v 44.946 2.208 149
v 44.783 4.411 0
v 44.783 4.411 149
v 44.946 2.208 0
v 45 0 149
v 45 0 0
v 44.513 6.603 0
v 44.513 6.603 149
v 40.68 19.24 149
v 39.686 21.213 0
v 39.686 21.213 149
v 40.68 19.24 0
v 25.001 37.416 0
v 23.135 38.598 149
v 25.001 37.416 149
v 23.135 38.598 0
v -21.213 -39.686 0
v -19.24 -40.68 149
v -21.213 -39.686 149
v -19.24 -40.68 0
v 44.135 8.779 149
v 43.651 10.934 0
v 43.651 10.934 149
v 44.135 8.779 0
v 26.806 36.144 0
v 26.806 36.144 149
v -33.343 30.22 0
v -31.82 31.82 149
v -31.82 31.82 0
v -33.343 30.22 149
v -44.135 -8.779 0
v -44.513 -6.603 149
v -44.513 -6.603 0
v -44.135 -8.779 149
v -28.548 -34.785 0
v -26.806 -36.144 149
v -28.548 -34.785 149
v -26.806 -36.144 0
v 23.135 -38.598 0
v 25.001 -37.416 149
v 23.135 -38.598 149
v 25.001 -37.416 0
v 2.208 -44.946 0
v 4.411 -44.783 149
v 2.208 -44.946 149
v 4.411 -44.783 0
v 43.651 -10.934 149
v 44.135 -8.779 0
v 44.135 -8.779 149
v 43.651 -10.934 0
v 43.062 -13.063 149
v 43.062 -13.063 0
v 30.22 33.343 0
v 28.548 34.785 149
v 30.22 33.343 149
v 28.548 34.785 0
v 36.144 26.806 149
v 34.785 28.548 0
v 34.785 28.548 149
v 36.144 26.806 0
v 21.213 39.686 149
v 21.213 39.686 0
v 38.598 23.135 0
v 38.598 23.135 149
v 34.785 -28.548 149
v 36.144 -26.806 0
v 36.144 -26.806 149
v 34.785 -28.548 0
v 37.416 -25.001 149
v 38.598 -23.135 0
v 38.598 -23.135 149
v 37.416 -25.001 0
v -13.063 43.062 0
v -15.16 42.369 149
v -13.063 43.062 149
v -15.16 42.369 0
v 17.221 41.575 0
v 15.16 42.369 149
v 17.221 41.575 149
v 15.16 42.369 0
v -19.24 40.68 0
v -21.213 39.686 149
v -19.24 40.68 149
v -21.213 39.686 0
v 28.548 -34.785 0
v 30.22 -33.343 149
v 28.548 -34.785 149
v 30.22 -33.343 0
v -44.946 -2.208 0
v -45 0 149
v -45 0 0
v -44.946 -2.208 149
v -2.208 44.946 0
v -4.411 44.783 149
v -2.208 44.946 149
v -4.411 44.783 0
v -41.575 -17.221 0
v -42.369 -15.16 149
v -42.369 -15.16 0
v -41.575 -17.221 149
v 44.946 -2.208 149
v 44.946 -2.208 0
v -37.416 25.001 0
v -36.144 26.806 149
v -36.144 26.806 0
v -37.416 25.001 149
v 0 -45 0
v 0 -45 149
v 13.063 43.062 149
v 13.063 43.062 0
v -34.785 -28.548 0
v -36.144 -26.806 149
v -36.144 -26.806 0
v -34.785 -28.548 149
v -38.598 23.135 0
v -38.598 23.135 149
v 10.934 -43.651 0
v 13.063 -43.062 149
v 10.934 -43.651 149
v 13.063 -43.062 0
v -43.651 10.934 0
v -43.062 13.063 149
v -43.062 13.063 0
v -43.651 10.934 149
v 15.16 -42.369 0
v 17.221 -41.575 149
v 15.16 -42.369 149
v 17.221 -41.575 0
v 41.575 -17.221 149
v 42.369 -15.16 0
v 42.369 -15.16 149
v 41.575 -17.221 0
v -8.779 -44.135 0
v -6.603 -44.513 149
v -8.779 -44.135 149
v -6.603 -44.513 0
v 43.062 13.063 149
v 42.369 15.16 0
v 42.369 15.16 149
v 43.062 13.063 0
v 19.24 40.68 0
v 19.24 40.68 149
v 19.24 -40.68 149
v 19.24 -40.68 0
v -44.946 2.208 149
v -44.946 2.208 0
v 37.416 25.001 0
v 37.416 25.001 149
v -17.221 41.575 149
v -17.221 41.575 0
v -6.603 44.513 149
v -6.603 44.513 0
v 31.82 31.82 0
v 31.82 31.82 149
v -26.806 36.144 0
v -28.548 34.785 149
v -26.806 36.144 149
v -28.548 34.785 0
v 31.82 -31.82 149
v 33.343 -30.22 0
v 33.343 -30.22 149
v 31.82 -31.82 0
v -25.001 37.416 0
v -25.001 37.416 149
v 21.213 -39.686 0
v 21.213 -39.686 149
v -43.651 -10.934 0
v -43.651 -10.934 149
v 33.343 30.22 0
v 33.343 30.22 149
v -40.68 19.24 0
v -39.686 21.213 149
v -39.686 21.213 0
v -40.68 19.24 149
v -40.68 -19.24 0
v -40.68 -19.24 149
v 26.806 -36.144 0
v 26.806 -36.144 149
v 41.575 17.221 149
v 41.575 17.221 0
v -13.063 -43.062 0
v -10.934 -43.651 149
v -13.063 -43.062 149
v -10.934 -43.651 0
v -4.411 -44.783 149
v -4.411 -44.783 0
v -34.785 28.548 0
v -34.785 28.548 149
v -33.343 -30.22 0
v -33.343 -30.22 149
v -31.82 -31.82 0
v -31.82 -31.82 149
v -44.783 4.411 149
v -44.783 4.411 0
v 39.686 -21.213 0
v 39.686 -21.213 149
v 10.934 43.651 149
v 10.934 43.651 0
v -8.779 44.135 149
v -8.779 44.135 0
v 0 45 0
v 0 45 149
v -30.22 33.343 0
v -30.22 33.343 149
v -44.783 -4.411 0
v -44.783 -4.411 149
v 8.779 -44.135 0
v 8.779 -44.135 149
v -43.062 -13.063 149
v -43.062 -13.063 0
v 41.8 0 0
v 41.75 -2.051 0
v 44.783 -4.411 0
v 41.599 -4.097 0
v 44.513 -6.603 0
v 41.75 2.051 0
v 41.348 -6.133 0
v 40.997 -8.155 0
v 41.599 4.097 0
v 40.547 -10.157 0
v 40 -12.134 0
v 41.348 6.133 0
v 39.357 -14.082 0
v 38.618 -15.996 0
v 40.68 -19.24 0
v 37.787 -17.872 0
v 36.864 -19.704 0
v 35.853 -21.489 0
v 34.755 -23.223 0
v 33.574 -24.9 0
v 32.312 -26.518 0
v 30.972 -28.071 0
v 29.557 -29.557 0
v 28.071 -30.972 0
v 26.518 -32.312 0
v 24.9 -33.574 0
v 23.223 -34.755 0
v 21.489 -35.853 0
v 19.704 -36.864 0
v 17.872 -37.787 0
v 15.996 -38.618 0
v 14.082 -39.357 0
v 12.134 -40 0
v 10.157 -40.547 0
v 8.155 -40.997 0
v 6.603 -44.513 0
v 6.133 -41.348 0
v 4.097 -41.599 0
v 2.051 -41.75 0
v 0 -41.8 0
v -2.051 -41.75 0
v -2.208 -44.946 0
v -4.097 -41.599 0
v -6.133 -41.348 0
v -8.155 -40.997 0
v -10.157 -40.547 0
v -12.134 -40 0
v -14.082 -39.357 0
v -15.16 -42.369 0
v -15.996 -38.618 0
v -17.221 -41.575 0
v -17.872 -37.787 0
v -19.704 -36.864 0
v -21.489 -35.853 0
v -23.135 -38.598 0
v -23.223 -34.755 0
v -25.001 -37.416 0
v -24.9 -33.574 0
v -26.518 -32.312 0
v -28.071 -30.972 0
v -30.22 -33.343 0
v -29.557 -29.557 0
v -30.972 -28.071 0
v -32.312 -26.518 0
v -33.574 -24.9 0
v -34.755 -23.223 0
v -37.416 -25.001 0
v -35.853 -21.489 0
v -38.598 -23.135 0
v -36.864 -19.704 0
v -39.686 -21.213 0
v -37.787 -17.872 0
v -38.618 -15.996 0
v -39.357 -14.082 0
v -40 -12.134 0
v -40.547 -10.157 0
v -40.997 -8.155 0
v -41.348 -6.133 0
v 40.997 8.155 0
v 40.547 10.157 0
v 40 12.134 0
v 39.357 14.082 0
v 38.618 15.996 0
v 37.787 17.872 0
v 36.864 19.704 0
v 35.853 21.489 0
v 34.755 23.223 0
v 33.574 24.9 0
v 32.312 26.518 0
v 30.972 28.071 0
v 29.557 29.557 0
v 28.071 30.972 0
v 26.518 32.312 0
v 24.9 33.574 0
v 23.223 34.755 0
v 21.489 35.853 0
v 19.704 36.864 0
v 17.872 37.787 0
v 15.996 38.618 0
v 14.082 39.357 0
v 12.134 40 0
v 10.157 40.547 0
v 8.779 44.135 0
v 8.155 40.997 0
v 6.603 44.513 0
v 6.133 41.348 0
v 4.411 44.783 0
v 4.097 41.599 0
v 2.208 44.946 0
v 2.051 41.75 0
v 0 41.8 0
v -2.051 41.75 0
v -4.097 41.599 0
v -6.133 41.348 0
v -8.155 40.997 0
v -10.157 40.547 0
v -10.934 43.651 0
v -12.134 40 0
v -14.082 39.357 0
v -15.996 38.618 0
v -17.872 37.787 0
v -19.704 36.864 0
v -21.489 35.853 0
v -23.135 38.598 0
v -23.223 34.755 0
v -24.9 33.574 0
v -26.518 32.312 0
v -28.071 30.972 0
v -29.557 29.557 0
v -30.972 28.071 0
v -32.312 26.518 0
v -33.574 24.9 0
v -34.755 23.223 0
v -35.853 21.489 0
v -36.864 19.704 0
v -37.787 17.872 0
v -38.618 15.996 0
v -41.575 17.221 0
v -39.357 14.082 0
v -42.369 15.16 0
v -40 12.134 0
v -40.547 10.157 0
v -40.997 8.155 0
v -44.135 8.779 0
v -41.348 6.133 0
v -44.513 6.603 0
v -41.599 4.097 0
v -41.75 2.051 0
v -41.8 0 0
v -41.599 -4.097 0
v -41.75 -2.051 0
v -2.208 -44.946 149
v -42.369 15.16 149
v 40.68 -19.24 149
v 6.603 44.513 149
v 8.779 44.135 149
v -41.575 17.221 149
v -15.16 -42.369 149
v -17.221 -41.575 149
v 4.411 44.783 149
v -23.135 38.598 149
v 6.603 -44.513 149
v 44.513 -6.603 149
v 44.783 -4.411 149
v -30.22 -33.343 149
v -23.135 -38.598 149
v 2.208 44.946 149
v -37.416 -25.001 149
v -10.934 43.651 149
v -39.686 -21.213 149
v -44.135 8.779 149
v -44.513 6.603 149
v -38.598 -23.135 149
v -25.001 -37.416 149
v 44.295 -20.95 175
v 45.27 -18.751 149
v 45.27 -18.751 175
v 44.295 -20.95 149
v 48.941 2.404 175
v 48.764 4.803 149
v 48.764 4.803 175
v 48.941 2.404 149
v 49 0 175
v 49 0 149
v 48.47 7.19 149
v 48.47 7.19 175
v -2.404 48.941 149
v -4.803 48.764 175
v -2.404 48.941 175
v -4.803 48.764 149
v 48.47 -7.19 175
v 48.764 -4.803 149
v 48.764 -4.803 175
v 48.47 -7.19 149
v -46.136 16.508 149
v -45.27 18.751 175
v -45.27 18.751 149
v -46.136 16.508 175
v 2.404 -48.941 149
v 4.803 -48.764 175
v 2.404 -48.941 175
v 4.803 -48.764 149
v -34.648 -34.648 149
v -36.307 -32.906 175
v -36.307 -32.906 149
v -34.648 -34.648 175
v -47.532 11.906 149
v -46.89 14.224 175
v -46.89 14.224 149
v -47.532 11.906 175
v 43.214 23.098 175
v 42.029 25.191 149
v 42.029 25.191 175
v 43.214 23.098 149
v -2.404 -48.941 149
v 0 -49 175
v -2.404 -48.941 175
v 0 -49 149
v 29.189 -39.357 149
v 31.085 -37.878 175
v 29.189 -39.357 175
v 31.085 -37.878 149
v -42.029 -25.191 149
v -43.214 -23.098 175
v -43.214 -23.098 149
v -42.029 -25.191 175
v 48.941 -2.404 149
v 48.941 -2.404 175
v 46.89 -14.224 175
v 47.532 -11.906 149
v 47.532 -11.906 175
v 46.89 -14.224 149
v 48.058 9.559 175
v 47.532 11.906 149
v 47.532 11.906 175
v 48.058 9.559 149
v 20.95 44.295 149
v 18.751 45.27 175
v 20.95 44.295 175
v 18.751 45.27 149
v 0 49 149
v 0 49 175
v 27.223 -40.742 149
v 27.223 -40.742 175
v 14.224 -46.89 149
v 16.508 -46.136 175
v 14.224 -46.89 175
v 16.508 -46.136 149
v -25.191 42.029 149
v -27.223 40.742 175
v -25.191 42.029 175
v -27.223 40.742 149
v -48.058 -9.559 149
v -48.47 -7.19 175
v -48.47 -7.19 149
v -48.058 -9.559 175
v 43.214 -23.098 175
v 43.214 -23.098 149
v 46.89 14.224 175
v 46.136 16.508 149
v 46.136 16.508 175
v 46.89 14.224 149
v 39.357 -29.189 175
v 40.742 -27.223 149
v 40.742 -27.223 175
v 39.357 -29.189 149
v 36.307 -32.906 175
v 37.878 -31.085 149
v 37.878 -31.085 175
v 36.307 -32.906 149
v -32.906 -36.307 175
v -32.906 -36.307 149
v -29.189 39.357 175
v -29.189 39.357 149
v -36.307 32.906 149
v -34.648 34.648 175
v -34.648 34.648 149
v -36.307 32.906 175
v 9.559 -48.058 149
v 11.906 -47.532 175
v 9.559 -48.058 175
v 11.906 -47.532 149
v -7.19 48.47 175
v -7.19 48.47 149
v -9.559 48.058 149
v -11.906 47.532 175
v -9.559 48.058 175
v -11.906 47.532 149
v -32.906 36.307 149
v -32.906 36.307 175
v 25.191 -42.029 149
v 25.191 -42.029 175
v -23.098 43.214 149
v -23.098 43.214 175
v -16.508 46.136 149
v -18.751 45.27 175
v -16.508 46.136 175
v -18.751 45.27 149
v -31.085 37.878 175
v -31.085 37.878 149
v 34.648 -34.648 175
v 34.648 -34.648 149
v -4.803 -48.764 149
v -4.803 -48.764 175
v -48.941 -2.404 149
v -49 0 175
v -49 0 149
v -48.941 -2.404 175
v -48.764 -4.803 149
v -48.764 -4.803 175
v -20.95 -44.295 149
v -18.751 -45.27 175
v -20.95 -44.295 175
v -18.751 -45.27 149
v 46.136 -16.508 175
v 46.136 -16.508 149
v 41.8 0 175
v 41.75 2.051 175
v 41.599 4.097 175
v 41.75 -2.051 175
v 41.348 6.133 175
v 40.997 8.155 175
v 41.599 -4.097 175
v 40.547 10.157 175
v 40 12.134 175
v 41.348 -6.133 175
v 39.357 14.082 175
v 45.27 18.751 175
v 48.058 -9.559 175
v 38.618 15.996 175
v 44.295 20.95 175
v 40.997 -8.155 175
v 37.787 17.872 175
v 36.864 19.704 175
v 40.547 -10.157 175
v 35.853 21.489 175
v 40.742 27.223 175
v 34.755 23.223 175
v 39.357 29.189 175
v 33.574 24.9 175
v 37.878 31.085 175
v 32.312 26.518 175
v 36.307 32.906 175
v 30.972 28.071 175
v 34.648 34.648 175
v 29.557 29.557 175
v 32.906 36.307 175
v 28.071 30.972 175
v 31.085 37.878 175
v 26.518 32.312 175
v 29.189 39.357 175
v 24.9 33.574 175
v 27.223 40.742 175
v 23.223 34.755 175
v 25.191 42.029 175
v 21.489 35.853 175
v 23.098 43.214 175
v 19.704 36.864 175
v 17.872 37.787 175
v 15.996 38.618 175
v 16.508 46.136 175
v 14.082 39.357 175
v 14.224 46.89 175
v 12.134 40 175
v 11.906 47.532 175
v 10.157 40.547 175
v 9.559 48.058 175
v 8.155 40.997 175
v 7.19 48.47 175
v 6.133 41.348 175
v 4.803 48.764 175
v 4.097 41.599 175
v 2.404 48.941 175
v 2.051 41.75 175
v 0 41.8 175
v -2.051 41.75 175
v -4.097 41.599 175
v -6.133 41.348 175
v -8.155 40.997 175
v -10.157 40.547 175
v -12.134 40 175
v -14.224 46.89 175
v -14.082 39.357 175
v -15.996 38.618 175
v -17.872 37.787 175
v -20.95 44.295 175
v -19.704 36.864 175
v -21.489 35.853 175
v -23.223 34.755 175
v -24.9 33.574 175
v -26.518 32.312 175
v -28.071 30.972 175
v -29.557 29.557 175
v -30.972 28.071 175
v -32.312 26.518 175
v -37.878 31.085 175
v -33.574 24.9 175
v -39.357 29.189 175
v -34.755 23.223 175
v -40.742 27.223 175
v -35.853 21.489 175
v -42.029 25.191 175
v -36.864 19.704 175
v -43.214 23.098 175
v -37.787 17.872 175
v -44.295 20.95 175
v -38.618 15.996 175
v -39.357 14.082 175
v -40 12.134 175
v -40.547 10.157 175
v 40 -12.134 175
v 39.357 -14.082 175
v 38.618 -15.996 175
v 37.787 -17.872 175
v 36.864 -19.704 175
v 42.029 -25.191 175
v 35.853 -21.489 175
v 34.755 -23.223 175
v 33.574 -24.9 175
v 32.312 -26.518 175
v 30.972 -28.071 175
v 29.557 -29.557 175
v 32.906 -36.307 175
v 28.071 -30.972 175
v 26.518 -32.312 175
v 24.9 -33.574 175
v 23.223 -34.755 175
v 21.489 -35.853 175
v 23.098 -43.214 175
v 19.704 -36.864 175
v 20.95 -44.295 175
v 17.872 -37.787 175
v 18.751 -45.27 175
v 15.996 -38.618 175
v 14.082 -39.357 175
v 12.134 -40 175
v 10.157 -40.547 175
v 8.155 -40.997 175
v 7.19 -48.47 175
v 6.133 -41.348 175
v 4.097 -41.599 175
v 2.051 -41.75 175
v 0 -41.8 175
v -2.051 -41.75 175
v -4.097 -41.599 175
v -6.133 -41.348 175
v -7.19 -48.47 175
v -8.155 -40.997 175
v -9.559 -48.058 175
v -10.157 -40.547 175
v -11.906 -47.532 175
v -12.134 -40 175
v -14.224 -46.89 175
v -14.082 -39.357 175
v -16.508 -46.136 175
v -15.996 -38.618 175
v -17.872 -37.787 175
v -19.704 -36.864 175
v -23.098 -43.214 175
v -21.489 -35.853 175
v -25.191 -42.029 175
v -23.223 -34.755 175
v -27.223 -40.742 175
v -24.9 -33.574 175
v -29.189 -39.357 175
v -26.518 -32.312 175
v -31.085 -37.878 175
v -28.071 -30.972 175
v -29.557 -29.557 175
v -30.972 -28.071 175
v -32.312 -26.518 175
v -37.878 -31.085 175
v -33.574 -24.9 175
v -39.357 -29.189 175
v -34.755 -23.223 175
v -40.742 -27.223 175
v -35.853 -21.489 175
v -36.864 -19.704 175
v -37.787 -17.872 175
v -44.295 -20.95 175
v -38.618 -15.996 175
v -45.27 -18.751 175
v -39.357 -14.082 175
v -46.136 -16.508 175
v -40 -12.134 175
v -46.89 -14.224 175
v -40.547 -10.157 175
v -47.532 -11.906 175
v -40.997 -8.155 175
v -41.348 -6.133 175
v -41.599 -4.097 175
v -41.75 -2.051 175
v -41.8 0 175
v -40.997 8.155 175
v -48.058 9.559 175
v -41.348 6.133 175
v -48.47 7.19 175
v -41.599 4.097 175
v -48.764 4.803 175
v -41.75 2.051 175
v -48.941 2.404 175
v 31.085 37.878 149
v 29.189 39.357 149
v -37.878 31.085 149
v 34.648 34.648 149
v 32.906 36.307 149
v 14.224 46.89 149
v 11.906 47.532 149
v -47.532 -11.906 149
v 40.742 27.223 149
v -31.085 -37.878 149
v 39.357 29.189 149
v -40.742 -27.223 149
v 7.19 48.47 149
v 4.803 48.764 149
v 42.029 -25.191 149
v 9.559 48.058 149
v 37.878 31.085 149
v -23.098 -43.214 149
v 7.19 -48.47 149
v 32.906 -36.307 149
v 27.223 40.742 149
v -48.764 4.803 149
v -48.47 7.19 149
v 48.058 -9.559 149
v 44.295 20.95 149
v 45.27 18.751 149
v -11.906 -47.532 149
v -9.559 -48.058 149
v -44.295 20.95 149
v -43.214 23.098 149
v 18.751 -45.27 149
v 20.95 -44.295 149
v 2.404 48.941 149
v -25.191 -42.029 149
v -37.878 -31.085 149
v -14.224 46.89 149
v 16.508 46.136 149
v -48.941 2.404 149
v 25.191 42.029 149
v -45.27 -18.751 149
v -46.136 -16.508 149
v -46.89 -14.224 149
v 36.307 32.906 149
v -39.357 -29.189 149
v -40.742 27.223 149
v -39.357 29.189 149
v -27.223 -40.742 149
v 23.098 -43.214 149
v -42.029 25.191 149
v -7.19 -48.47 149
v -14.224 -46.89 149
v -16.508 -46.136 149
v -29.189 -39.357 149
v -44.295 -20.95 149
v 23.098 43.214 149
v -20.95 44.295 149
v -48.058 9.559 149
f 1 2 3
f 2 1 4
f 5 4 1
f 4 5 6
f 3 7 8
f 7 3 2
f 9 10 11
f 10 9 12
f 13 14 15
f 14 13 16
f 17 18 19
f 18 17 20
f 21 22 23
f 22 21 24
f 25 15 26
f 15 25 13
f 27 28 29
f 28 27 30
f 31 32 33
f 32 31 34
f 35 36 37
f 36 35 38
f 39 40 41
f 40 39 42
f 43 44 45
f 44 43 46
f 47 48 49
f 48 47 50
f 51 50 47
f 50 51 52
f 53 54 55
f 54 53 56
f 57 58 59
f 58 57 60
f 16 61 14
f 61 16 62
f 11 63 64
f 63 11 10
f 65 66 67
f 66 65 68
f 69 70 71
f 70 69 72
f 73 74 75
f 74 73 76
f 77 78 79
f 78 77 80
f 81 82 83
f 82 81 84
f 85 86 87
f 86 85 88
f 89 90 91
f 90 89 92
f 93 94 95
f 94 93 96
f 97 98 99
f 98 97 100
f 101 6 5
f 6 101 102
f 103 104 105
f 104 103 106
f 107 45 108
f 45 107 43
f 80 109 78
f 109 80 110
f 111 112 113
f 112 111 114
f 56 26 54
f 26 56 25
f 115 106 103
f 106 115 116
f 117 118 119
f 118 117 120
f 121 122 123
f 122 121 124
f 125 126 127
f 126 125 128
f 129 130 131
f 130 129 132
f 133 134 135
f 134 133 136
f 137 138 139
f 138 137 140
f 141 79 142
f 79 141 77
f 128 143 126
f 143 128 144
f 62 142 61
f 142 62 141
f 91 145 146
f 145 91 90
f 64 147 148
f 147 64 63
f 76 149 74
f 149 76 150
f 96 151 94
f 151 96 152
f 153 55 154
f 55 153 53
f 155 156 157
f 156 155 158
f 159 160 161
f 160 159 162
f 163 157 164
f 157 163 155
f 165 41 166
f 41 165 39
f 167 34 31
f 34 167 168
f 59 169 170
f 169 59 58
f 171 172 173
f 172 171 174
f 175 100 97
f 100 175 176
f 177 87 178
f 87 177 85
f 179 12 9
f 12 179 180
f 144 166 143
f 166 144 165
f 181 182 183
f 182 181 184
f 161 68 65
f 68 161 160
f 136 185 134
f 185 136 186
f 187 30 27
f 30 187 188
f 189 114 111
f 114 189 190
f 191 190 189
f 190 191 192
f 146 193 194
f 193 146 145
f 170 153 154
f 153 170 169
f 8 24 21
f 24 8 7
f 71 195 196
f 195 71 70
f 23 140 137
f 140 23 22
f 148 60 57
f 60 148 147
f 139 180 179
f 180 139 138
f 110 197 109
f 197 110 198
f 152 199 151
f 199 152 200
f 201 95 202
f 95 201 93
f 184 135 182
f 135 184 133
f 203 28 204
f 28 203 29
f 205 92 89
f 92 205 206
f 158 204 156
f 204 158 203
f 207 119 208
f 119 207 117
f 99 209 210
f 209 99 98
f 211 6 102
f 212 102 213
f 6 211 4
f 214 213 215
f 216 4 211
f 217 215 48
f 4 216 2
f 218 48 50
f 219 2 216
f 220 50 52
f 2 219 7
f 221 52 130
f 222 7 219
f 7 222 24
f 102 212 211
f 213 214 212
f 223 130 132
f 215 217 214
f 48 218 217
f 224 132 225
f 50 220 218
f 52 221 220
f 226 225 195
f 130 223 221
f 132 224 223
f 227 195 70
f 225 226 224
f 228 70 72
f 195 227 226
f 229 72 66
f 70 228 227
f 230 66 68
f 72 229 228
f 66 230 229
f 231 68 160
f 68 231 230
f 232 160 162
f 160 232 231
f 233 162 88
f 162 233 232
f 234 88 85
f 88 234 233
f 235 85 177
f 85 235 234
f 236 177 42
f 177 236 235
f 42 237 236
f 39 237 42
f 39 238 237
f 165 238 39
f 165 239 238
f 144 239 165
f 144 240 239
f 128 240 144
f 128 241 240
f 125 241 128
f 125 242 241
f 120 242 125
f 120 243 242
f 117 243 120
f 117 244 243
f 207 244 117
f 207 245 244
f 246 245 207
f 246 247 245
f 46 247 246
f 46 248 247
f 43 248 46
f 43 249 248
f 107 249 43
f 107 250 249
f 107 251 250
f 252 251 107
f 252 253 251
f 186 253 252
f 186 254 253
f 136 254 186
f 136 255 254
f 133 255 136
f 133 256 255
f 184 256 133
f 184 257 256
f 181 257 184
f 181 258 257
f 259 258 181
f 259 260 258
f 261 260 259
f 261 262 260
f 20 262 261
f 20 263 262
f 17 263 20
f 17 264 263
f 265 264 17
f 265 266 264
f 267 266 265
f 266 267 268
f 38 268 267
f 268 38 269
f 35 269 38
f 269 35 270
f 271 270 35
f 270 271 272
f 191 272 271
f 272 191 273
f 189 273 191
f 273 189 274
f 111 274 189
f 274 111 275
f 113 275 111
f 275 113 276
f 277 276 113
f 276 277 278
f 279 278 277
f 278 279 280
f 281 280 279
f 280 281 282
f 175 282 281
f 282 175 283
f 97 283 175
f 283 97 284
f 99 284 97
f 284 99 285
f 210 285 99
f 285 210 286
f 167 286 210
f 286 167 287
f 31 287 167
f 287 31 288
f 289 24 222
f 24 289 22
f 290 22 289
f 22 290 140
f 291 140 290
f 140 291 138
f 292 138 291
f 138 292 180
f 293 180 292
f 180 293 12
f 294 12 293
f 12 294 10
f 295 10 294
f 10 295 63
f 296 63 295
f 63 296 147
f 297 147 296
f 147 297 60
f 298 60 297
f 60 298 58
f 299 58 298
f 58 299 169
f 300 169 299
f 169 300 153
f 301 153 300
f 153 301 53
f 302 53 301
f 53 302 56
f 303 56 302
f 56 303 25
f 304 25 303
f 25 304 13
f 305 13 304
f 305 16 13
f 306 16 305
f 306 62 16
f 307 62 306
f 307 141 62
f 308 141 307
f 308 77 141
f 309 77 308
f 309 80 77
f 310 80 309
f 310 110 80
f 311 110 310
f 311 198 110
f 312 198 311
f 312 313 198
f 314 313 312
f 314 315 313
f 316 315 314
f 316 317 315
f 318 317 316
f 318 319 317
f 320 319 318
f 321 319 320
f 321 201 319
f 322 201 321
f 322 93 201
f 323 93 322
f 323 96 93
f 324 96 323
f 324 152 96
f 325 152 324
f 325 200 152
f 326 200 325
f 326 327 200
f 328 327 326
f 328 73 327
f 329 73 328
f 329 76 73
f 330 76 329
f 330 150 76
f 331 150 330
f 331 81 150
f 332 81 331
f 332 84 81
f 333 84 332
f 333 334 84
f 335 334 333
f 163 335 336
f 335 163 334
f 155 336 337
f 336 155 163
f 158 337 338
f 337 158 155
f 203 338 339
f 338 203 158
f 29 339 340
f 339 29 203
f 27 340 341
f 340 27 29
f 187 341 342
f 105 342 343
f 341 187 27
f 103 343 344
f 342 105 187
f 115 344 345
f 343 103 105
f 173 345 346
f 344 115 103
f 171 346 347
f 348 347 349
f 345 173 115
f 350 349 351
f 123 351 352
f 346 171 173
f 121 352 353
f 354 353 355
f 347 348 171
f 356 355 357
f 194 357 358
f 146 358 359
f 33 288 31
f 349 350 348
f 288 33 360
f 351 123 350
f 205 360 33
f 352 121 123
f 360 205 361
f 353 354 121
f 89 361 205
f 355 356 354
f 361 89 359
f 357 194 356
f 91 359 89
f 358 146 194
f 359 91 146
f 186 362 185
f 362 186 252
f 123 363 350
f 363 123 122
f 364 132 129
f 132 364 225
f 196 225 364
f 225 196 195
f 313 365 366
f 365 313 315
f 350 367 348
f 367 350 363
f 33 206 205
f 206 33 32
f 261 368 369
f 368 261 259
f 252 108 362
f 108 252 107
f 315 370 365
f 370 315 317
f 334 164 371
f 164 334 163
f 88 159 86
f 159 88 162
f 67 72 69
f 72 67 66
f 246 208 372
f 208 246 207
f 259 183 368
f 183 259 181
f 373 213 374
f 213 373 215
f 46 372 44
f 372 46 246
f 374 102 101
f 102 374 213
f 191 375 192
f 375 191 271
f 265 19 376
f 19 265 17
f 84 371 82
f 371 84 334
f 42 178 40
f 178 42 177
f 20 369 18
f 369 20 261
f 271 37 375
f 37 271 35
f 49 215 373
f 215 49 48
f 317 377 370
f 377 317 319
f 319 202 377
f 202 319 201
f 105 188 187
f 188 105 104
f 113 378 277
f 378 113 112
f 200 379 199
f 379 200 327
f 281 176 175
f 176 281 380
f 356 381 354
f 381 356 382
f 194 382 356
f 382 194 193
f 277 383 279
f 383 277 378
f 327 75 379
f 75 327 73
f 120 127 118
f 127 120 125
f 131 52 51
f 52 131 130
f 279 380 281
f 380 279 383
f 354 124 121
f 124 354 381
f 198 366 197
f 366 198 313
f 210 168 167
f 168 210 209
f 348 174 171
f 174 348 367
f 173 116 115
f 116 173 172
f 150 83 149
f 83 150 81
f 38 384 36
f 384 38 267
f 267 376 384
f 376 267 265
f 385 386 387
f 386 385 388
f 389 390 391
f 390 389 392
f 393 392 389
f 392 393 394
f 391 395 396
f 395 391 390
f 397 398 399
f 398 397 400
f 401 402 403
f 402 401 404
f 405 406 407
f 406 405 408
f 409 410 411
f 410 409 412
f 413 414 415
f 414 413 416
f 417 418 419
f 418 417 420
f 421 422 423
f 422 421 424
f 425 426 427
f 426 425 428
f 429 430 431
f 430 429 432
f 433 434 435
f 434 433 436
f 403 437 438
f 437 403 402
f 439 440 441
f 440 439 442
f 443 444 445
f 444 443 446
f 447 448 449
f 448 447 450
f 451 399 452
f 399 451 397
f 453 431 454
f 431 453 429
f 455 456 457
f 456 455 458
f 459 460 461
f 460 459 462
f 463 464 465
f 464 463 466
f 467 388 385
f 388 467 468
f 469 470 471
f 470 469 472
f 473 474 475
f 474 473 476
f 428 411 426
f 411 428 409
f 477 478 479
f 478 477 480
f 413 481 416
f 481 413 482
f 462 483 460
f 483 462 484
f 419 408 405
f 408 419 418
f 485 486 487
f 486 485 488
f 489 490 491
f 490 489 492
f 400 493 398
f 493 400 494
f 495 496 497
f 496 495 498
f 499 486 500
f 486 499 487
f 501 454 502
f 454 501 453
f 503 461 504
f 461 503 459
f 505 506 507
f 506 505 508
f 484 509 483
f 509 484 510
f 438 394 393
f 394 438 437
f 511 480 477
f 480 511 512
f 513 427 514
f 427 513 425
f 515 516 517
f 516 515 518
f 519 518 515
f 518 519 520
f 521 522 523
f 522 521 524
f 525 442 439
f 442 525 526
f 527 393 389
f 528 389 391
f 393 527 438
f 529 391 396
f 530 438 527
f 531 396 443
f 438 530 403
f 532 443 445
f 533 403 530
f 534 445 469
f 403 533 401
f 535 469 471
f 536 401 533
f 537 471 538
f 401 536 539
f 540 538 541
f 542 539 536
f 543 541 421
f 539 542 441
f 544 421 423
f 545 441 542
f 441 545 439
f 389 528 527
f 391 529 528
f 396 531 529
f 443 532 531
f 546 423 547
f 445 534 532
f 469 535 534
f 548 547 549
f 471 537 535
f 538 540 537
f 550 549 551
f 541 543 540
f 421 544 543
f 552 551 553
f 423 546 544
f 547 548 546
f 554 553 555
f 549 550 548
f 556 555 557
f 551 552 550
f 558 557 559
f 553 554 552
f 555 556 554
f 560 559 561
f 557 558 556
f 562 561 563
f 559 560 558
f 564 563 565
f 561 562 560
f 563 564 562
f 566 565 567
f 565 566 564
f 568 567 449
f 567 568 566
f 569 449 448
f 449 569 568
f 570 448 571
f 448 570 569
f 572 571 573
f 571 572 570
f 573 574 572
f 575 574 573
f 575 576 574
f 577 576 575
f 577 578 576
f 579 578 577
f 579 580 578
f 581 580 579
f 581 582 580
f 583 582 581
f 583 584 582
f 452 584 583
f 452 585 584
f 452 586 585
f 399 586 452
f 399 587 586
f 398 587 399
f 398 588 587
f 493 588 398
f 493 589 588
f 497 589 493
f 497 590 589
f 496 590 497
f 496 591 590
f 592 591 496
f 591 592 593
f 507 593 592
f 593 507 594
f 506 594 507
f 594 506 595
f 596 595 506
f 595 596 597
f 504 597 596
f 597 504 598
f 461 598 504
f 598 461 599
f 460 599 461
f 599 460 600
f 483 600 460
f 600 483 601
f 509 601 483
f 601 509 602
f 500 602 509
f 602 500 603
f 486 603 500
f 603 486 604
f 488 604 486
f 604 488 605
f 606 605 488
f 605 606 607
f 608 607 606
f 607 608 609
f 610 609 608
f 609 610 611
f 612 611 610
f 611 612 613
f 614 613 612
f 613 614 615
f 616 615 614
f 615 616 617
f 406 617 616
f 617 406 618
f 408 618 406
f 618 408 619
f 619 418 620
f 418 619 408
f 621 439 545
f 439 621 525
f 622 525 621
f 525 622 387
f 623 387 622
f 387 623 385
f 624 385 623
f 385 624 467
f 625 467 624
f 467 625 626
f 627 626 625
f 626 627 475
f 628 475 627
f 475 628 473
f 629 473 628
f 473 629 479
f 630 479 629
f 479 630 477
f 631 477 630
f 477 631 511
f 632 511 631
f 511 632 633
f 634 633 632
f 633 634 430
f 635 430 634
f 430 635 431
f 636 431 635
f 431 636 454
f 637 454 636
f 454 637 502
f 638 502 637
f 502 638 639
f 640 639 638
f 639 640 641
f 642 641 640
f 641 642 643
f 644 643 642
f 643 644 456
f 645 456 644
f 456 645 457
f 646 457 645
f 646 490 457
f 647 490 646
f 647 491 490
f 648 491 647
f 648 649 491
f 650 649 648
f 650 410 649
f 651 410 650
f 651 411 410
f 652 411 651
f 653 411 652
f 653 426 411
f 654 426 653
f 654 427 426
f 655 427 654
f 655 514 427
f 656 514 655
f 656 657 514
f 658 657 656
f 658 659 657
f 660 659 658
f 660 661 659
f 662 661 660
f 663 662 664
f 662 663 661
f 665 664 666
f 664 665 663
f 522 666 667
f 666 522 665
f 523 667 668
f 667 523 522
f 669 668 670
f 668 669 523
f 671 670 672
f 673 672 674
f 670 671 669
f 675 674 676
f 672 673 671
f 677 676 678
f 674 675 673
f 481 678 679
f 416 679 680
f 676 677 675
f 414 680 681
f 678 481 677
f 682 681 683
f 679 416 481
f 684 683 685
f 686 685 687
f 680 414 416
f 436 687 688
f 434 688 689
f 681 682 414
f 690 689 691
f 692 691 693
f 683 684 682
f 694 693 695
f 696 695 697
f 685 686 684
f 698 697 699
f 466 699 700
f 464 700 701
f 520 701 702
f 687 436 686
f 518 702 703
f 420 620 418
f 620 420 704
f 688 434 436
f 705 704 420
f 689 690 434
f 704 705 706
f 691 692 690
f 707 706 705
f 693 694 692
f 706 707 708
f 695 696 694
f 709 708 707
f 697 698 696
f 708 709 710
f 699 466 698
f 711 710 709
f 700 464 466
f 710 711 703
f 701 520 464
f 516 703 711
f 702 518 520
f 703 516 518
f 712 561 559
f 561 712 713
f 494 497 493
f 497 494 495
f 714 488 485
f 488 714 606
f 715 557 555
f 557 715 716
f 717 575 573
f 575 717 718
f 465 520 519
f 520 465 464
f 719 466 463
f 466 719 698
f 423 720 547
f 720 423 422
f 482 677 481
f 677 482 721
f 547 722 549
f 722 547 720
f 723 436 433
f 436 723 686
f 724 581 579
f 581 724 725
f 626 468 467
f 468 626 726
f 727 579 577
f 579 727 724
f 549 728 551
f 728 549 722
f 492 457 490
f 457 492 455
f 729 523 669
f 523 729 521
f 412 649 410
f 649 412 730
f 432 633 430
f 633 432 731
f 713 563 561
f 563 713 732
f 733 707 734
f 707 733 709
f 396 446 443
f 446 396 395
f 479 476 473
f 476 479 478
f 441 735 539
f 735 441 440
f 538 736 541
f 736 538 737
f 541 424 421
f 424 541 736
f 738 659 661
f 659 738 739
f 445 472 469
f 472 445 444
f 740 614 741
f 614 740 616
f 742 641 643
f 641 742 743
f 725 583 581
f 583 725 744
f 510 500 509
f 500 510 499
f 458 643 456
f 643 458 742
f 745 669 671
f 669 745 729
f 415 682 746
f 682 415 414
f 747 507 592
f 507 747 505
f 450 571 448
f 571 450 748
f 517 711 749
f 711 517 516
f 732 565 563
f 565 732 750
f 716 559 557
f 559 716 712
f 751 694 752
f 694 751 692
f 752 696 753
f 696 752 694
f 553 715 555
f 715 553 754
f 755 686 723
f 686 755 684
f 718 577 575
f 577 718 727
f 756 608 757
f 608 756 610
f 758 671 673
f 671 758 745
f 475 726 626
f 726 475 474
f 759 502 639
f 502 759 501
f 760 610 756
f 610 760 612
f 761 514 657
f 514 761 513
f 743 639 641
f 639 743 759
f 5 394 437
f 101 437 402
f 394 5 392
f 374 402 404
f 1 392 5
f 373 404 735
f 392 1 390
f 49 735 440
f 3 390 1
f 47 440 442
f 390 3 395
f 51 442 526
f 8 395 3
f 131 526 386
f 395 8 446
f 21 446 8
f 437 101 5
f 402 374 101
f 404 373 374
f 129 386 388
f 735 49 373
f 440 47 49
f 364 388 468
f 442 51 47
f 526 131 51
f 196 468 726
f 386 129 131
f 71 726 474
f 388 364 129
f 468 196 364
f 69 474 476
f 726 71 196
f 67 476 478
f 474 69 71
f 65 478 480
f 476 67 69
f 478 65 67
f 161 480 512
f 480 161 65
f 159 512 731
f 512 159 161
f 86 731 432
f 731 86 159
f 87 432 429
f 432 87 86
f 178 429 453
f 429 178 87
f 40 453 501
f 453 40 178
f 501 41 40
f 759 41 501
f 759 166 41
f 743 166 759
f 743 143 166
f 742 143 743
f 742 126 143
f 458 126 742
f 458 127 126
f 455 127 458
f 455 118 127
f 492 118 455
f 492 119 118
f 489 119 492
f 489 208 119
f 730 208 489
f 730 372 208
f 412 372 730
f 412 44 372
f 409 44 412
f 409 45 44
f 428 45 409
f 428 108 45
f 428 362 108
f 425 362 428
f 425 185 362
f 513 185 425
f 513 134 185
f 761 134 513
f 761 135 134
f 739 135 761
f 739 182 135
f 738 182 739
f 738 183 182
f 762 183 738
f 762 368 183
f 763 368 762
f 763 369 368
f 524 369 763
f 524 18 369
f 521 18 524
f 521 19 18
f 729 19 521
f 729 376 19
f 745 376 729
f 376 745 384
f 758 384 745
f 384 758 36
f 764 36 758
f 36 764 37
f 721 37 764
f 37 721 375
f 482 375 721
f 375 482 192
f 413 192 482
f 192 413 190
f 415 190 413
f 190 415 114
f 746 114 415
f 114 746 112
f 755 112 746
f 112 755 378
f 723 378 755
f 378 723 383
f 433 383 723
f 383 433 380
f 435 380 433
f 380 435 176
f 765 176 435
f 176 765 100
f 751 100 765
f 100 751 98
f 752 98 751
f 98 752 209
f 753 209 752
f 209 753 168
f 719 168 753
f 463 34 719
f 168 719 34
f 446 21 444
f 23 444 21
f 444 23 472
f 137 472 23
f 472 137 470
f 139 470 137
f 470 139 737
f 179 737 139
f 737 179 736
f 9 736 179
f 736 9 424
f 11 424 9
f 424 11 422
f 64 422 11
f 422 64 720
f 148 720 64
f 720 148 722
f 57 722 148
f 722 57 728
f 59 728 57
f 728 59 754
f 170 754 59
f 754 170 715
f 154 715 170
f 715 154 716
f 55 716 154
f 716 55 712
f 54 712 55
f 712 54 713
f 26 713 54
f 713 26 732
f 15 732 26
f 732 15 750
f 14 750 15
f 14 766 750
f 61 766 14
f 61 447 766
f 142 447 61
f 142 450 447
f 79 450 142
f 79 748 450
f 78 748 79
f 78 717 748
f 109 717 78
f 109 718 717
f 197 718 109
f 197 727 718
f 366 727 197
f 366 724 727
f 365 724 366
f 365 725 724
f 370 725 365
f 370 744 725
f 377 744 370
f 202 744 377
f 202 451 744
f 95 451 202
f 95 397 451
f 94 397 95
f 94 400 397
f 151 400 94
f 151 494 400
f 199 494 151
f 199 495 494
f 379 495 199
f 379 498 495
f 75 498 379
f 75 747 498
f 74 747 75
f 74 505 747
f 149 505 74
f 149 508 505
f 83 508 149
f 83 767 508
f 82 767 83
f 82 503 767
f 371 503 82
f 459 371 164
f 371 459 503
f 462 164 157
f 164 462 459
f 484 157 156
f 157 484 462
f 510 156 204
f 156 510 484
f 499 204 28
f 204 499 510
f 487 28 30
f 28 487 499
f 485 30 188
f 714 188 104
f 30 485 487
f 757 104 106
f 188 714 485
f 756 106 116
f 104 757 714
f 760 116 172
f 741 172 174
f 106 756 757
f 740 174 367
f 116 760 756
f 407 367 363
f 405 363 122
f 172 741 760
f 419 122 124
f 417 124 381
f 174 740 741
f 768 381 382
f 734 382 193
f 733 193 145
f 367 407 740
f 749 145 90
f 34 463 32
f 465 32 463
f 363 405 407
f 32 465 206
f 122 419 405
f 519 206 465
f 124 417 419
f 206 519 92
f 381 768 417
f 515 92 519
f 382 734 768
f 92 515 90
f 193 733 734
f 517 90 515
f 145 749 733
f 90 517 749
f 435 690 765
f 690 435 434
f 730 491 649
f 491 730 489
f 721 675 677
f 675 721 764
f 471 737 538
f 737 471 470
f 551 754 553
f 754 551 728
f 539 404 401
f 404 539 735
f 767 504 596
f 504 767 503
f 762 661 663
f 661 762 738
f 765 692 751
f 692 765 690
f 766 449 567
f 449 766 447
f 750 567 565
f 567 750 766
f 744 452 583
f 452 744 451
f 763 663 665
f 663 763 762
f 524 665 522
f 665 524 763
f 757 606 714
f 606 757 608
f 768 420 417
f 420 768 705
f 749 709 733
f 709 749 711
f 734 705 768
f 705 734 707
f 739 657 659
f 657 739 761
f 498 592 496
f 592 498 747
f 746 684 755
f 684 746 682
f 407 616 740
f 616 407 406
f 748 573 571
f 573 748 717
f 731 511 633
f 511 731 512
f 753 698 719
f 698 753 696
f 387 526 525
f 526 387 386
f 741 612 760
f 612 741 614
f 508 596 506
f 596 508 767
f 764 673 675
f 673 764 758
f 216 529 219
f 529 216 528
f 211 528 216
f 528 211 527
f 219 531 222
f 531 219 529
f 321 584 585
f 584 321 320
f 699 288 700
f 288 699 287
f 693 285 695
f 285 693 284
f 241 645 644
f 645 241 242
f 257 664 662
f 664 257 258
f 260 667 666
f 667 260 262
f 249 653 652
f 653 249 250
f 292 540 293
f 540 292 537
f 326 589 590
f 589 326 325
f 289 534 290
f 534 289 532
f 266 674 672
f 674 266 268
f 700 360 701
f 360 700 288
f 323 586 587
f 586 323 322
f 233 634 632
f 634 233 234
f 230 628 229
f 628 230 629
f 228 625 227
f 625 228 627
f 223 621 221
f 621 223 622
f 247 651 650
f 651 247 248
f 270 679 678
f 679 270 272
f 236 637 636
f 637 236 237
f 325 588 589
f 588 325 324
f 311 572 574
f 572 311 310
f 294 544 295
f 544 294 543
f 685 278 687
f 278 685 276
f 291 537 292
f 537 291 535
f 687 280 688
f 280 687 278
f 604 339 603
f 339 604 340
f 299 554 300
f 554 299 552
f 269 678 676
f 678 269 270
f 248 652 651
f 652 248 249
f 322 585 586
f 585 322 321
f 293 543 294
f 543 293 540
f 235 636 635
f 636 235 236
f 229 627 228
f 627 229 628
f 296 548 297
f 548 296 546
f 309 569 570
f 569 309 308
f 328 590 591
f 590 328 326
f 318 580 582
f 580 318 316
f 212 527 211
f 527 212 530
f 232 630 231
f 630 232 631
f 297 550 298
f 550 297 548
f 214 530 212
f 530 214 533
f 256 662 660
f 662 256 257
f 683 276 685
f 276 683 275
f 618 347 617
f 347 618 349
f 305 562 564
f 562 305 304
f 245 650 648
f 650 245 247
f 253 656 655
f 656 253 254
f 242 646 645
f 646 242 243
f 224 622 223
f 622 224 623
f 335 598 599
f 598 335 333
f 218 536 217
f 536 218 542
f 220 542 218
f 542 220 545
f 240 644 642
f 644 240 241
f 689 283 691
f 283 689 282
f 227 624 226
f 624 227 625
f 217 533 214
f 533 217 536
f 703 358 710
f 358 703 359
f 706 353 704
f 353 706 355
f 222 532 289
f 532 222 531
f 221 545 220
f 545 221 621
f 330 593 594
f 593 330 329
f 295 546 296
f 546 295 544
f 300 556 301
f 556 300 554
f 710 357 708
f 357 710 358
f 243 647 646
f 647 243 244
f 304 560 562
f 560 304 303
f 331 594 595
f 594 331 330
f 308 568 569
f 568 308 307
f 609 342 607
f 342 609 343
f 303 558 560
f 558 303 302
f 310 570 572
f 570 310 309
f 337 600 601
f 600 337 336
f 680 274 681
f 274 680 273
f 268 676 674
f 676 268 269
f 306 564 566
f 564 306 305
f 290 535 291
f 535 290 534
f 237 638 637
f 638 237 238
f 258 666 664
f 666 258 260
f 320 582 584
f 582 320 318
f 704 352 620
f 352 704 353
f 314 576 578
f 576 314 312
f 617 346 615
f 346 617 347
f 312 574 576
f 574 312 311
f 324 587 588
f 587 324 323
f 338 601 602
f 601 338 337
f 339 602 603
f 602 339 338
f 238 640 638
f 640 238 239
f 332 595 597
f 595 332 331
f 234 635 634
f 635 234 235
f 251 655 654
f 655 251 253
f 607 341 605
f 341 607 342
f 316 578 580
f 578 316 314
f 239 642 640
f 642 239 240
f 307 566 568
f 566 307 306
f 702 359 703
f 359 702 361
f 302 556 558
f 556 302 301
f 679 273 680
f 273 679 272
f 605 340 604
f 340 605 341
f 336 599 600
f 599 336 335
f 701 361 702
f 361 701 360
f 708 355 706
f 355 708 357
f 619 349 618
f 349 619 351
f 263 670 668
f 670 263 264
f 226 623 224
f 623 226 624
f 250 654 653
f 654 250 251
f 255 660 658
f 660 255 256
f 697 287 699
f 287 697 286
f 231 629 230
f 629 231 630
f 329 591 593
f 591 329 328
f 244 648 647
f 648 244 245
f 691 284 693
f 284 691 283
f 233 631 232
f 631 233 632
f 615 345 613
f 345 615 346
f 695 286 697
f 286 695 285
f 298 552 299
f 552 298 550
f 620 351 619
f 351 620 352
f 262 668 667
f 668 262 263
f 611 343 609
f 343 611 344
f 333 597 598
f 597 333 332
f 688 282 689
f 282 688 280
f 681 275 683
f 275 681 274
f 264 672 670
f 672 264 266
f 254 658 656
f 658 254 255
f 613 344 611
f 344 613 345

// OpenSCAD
// Parameters
pipe_standard = 1; //[1:1:1]
nominal_size = 90; //[50:180:1]
length_mm = 150; //[75:300:1]
orientation_straight = 1; //[1:1:1]
pipe_od = 90; //[50:180:1]
pipe_wall = 3.2; //[1.6:6.4:0.1]
fitting_length = 25; //[12:50:1]
fitting_radial_extra = 4; //[2:10:0.5]
overlap = 1; //[0.5:2:0.1]

$fn = 128;

// Module for HT Pipe (one connected solid)
module ht_pipe() {
    od = pipe_od;
    id = max(0.01, od - 2*pipe_wall);

    // Keep overlap valid and ensure a tiny epsilon to avoid coplanar artifacts
    ov  = min(overlap, fitting_length/2);
    eps = 0.02;

    // Outer radii
    r_main   = od/2;
    r_socket = r_main + fitting_radial_extra;

    // Z extents (all derived)
    z0 = 0;
    z1 = length_mm;
    z2 = length_mm + fitting_length;

    color([0.85, 0.85, 0.8])
    difference() {
        // OUTER: main pipe + socket, guaranteed connected by overlap
        union() {
            cylinder(r=r_main, h=(z1 - z0), center=false);

            translate([0, 0, z1 - ov])
                cylinder(r=r_socket, h=(z2 - (z1 - ov)), center=false);
        }

        // INNER VOID: continuous bore through entire part
        translate([0, 0, z0 - ov - eps])
            cylinder(r=id/2, h=(z2 - z0) + 2*ov + 2*eps, center=false);
    }
}

// Assembly
module assembly() {
    ht_pipe();
}

assembly();
